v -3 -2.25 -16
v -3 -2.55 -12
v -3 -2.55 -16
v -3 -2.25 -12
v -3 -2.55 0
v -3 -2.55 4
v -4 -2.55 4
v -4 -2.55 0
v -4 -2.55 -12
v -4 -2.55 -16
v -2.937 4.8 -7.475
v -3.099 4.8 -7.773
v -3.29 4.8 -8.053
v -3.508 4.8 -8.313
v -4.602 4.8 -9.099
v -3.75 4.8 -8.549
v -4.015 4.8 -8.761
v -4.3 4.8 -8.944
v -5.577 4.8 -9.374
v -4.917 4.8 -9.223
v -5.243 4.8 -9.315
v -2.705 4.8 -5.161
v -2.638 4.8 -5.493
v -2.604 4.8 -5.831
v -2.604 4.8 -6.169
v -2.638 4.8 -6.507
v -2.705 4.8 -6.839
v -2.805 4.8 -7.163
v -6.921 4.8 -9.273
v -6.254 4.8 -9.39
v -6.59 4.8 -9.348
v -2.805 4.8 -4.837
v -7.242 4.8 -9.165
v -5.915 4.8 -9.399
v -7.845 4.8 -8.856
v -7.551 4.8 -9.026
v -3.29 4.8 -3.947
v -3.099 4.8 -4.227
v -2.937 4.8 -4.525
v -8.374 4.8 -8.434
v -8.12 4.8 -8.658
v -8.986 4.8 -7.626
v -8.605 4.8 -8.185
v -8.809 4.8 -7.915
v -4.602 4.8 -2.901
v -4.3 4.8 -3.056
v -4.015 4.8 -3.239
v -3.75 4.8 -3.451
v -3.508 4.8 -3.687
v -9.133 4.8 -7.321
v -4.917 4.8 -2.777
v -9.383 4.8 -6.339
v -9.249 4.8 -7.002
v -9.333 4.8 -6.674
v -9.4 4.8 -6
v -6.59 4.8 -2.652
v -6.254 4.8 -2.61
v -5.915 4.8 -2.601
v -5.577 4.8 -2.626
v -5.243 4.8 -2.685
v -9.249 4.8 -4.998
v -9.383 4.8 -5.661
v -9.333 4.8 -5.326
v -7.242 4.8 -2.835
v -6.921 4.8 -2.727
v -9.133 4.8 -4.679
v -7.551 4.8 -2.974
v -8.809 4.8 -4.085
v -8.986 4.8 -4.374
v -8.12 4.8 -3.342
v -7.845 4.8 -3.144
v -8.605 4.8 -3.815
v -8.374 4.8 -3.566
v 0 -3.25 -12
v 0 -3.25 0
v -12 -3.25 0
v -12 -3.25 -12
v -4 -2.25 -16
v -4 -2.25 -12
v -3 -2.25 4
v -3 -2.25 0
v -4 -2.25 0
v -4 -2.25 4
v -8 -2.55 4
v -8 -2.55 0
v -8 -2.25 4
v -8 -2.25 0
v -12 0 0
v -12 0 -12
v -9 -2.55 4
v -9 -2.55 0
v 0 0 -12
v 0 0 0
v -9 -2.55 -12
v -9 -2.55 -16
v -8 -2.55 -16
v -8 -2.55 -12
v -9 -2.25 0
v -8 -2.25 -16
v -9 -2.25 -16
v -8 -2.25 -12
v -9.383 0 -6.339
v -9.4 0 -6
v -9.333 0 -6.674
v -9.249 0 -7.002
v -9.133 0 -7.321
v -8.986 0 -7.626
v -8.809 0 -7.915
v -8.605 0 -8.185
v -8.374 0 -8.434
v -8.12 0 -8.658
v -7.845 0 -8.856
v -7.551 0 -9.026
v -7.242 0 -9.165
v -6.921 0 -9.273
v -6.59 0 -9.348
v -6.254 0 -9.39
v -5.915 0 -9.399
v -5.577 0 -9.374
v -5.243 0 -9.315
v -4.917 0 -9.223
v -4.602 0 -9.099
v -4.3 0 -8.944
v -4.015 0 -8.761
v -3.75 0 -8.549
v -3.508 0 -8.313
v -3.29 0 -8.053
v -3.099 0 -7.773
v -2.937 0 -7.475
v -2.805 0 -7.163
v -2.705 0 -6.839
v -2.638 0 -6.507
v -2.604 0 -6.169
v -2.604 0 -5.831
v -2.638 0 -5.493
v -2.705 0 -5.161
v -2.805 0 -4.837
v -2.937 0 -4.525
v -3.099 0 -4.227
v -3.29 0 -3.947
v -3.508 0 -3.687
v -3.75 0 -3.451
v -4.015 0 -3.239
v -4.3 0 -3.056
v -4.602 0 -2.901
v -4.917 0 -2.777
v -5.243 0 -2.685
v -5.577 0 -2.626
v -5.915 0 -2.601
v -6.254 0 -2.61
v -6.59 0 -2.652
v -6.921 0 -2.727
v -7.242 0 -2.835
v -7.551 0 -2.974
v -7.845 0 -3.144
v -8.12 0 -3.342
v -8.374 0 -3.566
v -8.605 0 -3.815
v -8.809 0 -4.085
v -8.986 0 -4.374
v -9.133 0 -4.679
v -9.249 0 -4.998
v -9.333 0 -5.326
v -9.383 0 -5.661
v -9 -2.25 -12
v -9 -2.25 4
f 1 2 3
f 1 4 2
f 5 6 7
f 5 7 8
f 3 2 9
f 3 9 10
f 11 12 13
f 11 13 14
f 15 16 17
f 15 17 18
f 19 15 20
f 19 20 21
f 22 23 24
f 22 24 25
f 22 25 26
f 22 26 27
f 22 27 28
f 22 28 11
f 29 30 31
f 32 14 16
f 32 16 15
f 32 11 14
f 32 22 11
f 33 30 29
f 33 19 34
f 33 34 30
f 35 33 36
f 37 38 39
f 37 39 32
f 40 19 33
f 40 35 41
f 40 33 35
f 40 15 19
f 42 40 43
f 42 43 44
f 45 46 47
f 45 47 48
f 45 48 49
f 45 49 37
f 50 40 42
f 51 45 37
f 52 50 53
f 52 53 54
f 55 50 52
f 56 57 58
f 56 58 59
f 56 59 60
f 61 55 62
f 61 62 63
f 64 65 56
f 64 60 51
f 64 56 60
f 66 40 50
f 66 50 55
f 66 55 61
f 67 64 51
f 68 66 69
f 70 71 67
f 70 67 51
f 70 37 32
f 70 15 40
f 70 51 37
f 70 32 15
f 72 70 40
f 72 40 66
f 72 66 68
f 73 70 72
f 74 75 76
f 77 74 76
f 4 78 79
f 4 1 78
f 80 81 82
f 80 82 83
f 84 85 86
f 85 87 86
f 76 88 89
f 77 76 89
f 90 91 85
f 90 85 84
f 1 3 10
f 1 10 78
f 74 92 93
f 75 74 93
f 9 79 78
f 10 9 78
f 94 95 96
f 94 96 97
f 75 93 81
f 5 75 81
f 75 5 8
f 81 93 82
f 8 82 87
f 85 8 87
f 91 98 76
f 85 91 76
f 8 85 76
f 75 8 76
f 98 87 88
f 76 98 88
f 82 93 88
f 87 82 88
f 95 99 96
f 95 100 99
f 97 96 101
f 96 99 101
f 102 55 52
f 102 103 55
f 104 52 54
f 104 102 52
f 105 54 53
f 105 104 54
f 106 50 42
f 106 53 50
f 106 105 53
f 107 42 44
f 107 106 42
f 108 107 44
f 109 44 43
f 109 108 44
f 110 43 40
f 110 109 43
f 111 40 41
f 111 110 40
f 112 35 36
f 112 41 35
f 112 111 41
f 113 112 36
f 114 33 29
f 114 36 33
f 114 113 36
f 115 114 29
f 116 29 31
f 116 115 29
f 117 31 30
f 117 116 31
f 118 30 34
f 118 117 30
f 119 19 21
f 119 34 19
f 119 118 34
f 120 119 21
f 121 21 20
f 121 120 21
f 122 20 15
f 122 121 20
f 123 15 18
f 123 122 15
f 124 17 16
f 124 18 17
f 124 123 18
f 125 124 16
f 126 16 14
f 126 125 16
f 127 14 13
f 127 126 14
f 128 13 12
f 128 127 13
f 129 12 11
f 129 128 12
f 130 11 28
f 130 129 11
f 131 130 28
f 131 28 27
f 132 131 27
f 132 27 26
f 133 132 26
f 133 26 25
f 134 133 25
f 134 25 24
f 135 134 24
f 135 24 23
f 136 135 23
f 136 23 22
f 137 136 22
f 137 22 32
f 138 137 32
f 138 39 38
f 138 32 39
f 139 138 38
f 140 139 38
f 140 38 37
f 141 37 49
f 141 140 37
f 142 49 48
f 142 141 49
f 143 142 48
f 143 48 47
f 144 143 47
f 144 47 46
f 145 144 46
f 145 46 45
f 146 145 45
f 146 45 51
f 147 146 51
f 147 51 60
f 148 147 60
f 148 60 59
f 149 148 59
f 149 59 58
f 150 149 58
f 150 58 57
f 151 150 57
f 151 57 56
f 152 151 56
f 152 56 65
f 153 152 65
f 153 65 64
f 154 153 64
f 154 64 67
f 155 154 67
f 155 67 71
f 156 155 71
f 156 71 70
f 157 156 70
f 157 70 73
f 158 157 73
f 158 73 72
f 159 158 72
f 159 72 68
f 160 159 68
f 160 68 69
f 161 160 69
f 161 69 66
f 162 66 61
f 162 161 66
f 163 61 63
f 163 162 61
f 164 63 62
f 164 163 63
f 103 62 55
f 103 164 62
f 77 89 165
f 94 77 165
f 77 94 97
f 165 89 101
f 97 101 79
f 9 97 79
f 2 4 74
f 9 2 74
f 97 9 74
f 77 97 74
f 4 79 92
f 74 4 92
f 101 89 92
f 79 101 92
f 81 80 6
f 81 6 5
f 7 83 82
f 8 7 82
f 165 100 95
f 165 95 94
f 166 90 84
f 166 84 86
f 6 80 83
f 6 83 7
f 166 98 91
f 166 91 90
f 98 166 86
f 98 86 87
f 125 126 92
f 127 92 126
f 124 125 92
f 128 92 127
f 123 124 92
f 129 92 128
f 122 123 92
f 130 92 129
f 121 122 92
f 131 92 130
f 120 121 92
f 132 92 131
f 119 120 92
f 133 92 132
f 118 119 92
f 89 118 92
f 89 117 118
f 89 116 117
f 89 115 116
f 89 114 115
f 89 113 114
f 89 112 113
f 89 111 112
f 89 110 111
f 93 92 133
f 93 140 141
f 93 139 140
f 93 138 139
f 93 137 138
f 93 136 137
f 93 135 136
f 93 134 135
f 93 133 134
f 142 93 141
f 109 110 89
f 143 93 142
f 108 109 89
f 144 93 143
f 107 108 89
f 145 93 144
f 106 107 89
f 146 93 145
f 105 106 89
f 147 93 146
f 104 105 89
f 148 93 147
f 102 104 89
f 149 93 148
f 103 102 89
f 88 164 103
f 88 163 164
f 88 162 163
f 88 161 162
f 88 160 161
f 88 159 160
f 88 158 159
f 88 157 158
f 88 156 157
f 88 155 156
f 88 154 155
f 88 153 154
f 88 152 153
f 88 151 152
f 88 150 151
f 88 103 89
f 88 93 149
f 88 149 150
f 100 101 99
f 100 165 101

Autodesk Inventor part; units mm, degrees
ref_plane "YZ Plane" through (0, 0, 0) normal (1, 0, 0) x (0, 1, 0)
ref_plane "XZ Plane" through (0, 0, 0) normal (0, 1, 0) x (-1, 0, 0)
ref_plane "XY Plane" through (0, 0, 0) normal (0, 0, 1) x (1, 0, 0)
sketch "Sketch1" plane through (0, 0, 0) normal (0, 1, 0) x (-1, 0, 0)
  line L0 (12, -12) -> (0, -12)
  line L1 (0, -12) -> (0, 0)
  line L2 (0, 0) -> (12, 0)
  line L3 (12, 0) -> (12, -12)
  circle A0 centre (6, -6) radius 3.4
  line L4 (12, 0) -> (0, -12) construction
  point P0 (6, -6)
  dimension "d0" = 12
  dimension "d1" = 12
  dimension "d4" = 6.8
extrude "Extrusion1" add sketch "Sketch1" against normal blind 3.25 contours L0 L1 L2 L3 | A0
extrude "Extrusion2" add sketch "Sketch1" along normal blind 4.8 contours A0
ref_plane "Work Plane1" through (-3, 0, 0) normal (1, 0, 0) x (0, 0, -1)
sketch "Sketch2" plane through (-3, 0, 0) normal (1, 0, 0) x (0, 0, -1)
  line L0 (12, -3.25) -> (0, -3.25) projected
  line L1 (12, -2.55) -> (16, -2.55)
  line L2 (16, -2.55) -> (16, -2.25)
  line L3 (16, -2.25) -> (12, -2.25)
  line L4 (12, -2.25) -> (12, -2.55)
  line L5 (12, 0) -> (12, -3.25) projected
  point P0 (0, 0)
  dimension "d8" = 4
  dimension "d9" = 0.3
  dimension "d10" = 0.7
extrude "Extrusion3" add sketch "Sketch2" against normal blind 1
ref_plane "Work Plane2" through (-6, 0, 0) normal (1, 0, 0) x (0, 0, -1)
ref_plane "Work Plane3" through (0, 0, -6) normal (0, 0, -1) x (-1, 0, 0)
mirror "Mirror1" about plane through (-6, 0, 0) normal (1, 0, 0) of "Extrusion3"
mirror "Mirror2" about plane through (0, 0, -6) normal (0, 0, -1) of "Extrusion3", "Mirror1"
properties part number "Button"
